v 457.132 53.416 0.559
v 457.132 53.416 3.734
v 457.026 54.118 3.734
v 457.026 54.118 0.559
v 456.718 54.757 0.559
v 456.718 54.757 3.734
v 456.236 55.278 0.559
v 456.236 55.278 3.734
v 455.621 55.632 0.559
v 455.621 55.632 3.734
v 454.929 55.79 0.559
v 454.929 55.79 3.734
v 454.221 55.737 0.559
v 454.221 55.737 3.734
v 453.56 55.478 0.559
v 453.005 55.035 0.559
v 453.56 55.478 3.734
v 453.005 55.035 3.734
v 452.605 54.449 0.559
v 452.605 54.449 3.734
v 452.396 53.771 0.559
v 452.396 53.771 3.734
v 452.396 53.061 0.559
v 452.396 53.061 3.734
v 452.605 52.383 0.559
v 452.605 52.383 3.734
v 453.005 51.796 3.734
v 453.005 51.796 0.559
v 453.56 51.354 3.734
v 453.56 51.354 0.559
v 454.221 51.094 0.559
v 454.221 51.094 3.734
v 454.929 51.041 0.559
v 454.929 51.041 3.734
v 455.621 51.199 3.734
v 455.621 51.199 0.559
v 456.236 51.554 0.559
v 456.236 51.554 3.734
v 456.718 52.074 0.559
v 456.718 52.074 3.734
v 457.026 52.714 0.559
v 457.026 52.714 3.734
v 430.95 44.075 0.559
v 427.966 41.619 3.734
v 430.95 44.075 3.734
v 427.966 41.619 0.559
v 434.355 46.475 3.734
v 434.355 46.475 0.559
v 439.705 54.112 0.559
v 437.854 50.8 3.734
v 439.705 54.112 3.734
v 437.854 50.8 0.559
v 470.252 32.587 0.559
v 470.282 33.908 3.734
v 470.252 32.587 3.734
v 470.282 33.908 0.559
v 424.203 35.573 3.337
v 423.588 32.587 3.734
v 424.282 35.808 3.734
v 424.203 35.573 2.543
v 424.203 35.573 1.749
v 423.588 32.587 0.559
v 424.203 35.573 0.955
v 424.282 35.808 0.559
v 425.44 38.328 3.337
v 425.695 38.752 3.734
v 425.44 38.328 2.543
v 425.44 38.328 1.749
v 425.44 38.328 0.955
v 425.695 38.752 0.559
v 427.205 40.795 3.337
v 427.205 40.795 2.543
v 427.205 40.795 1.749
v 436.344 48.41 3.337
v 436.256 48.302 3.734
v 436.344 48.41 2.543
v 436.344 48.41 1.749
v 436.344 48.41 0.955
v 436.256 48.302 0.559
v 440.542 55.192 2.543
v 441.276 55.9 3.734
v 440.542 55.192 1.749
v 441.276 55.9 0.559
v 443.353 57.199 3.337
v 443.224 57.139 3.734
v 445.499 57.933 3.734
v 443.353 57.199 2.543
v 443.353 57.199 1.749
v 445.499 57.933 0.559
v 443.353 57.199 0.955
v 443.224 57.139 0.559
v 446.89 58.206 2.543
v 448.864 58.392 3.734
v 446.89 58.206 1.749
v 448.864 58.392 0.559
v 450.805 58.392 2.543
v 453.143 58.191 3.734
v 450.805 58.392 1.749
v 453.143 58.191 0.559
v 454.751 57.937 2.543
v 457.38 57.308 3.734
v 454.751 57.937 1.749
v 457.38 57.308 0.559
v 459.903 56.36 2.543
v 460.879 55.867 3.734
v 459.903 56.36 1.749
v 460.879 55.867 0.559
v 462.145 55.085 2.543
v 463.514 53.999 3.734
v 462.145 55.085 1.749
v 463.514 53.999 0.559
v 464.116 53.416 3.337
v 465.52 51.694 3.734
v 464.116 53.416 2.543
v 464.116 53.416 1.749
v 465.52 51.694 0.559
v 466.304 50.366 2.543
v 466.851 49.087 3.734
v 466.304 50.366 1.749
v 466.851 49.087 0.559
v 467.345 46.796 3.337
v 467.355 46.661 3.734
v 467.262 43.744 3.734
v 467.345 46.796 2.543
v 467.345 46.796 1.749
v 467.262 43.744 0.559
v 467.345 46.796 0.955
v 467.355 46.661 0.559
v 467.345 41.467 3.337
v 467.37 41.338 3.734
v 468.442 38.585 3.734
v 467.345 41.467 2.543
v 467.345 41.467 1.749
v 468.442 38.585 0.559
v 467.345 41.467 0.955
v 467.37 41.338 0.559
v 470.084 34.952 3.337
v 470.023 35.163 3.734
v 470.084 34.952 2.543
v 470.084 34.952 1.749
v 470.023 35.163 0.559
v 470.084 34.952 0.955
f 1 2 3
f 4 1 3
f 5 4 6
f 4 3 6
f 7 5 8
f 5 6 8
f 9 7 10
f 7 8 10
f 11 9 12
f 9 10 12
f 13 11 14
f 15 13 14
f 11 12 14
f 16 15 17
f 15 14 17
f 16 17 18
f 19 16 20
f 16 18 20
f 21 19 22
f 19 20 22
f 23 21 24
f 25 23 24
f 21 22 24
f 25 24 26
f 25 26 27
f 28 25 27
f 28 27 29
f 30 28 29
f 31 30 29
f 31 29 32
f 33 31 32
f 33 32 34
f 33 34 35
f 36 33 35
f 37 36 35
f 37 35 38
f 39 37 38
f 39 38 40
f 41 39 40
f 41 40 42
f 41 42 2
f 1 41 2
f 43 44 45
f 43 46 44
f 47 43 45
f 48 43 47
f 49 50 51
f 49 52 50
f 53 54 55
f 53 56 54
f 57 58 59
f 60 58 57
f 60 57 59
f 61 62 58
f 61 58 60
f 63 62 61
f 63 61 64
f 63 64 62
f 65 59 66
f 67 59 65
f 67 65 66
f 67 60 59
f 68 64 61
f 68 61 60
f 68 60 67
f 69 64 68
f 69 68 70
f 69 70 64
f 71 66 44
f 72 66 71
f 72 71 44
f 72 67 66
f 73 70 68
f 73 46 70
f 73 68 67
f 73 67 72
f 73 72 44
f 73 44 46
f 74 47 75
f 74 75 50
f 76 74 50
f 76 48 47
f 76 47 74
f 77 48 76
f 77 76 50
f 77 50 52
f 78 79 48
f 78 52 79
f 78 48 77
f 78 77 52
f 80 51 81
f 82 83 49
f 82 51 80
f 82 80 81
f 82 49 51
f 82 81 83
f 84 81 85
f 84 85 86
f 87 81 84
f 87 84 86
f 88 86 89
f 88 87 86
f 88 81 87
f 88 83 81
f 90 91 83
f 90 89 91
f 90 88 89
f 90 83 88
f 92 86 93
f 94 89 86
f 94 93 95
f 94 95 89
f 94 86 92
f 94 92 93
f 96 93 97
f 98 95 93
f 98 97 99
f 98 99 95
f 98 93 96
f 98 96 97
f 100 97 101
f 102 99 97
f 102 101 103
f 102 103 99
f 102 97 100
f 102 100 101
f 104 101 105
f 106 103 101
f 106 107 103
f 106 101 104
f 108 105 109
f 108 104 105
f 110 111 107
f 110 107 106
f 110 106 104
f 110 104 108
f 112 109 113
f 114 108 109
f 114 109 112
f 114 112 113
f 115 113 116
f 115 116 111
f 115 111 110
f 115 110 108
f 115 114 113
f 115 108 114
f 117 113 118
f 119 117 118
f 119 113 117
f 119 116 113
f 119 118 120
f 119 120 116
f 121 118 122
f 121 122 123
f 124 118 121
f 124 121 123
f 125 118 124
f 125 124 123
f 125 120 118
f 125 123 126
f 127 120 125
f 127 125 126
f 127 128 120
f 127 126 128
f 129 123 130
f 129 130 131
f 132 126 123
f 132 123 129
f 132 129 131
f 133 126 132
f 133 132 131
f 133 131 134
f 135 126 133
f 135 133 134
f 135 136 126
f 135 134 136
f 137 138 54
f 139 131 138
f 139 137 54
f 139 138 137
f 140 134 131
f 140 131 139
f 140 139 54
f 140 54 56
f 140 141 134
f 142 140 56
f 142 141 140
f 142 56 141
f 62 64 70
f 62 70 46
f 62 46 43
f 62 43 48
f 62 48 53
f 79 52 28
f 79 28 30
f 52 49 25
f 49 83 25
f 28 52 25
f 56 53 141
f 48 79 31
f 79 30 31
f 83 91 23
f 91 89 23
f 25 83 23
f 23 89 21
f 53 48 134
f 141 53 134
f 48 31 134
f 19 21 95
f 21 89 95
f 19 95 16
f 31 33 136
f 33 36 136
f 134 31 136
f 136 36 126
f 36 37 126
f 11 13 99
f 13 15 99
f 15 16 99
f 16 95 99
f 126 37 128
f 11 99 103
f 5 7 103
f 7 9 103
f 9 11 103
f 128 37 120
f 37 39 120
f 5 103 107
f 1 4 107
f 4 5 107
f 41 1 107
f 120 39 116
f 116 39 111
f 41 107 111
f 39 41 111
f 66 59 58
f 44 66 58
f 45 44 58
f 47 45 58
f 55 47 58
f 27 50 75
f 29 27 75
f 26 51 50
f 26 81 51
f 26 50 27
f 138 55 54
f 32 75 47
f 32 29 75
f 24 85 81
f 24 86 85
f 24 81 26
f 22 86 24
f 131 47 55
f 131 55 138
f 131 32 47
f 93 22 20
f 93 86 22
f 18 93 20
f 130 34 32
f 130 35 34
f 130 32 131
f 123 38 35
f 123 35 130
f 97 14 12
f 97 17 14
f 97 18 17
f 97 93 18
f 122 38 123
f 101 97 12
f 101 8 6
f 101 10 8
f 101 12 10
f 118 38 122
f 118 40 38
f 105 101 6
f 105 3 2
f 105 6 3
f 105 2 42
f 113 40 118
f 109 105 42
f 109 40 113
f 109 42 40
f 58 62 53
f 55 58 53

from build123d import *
from OCP.BRepAlgoAPI import BRepAlgoAPI_Cut
from OCP.TopTools import TopTools_ListOfShape

# Parameters (mm, degrees)
SKETCH1_R           = 1.905
BOSS_EXTRUDE1_DEPTH = 4.292022727
SCALE1_SCALE        = 0.739744452
SKETCH2_R           = 2.38125
CUT_EXTRUDE1_DEPTH  = 474.934058965


with BuildPart() as part:
    # Sketch1 → Boss-Extrude1 (new body)
    with BuildSketch(Plane.XY):
        with BuildLine():
            Line((414.664092284, 28.837959437), (477.745187058, 28.837959437))
            add(Edge.make_bspline(
                [(414.664092284, 28.837959437), (415.153200535, 34.395030861), (420.485745831, 42.922593868), (432.858822753, 48.749849518), (437.336668693, 63.812055241), (455.660979606, 64.670643077), (469.273047892, 59.119436778), (474.839401849, 49.066135717), (472.340854494, 38.774622034), (478.419942664, 33.320049008), (477.745187058, 28.837959437)],
                knots=[0, 0, 0, 0, 0.159468666, 0.276152642, 0.381296496, 0.572074307, 0.70916512, 0.806266415, 0.876509393, 1, 1, 1, 1], degree=3))
        make_face()
        with Locations((456.790913361, 56.995264717)):
            Circle(SKETCH1_R, mode=Mode.SUBTRACT)
    extrude(amount=BOSS_EXTRUDE1_DEPTH)


with BuildPart() as part_1:
    # Scale1: scaled about (448.952587877, 43.242185137, 2.146011363)
    add(part.part.scale(SCALE1_SCALE).moved(Location((116.842401821, 11.254018593, 0.558511363))))


with BuildPart() as cut_extrude1_tool:
    # Sketch2 → Cut-Extrude1 (new, through all)
    with BuildSketch(Plane.XY.offset(3.733501485)):
        with Locations((454.750929555, 53.415813648)):
            Circle(SKETCH2_R)
    extrude(amount=-CUT_EXTRUDE1_DEPTH)


with BuildPart() as part_2:
    add(part_1.part)

    # Cut-Extrude1: cut by cut_extrude1_tool, with a tolerance
    cut_extrude1_stock = TopTools_ListOfShape()
    cut_extrude1_stock.Append(part_2.part.wrapped)
    cut_extrude1_tools = TopTools_ListOfShape()
    cut_extrude1_tools.Append(cut_extrude1_tool.part.wrapped)
    cut_extrude1_cut = BRepAlgoAPI_Cut()
    cut_extrude1_cut.SetArguments(cut_extrude1_stock)
    cut_extrude1_cut.SetTools(cut_extrude1_tools)
    cut_extrude1_cut.SetFuzzyValue(0.00001)
    cut_extrude1_cut.Build()
    add(Compound.cast(cut_extrude1_cut.Shape()).solids(), mode=Mode.REPLACE)


solid = part_2.part
